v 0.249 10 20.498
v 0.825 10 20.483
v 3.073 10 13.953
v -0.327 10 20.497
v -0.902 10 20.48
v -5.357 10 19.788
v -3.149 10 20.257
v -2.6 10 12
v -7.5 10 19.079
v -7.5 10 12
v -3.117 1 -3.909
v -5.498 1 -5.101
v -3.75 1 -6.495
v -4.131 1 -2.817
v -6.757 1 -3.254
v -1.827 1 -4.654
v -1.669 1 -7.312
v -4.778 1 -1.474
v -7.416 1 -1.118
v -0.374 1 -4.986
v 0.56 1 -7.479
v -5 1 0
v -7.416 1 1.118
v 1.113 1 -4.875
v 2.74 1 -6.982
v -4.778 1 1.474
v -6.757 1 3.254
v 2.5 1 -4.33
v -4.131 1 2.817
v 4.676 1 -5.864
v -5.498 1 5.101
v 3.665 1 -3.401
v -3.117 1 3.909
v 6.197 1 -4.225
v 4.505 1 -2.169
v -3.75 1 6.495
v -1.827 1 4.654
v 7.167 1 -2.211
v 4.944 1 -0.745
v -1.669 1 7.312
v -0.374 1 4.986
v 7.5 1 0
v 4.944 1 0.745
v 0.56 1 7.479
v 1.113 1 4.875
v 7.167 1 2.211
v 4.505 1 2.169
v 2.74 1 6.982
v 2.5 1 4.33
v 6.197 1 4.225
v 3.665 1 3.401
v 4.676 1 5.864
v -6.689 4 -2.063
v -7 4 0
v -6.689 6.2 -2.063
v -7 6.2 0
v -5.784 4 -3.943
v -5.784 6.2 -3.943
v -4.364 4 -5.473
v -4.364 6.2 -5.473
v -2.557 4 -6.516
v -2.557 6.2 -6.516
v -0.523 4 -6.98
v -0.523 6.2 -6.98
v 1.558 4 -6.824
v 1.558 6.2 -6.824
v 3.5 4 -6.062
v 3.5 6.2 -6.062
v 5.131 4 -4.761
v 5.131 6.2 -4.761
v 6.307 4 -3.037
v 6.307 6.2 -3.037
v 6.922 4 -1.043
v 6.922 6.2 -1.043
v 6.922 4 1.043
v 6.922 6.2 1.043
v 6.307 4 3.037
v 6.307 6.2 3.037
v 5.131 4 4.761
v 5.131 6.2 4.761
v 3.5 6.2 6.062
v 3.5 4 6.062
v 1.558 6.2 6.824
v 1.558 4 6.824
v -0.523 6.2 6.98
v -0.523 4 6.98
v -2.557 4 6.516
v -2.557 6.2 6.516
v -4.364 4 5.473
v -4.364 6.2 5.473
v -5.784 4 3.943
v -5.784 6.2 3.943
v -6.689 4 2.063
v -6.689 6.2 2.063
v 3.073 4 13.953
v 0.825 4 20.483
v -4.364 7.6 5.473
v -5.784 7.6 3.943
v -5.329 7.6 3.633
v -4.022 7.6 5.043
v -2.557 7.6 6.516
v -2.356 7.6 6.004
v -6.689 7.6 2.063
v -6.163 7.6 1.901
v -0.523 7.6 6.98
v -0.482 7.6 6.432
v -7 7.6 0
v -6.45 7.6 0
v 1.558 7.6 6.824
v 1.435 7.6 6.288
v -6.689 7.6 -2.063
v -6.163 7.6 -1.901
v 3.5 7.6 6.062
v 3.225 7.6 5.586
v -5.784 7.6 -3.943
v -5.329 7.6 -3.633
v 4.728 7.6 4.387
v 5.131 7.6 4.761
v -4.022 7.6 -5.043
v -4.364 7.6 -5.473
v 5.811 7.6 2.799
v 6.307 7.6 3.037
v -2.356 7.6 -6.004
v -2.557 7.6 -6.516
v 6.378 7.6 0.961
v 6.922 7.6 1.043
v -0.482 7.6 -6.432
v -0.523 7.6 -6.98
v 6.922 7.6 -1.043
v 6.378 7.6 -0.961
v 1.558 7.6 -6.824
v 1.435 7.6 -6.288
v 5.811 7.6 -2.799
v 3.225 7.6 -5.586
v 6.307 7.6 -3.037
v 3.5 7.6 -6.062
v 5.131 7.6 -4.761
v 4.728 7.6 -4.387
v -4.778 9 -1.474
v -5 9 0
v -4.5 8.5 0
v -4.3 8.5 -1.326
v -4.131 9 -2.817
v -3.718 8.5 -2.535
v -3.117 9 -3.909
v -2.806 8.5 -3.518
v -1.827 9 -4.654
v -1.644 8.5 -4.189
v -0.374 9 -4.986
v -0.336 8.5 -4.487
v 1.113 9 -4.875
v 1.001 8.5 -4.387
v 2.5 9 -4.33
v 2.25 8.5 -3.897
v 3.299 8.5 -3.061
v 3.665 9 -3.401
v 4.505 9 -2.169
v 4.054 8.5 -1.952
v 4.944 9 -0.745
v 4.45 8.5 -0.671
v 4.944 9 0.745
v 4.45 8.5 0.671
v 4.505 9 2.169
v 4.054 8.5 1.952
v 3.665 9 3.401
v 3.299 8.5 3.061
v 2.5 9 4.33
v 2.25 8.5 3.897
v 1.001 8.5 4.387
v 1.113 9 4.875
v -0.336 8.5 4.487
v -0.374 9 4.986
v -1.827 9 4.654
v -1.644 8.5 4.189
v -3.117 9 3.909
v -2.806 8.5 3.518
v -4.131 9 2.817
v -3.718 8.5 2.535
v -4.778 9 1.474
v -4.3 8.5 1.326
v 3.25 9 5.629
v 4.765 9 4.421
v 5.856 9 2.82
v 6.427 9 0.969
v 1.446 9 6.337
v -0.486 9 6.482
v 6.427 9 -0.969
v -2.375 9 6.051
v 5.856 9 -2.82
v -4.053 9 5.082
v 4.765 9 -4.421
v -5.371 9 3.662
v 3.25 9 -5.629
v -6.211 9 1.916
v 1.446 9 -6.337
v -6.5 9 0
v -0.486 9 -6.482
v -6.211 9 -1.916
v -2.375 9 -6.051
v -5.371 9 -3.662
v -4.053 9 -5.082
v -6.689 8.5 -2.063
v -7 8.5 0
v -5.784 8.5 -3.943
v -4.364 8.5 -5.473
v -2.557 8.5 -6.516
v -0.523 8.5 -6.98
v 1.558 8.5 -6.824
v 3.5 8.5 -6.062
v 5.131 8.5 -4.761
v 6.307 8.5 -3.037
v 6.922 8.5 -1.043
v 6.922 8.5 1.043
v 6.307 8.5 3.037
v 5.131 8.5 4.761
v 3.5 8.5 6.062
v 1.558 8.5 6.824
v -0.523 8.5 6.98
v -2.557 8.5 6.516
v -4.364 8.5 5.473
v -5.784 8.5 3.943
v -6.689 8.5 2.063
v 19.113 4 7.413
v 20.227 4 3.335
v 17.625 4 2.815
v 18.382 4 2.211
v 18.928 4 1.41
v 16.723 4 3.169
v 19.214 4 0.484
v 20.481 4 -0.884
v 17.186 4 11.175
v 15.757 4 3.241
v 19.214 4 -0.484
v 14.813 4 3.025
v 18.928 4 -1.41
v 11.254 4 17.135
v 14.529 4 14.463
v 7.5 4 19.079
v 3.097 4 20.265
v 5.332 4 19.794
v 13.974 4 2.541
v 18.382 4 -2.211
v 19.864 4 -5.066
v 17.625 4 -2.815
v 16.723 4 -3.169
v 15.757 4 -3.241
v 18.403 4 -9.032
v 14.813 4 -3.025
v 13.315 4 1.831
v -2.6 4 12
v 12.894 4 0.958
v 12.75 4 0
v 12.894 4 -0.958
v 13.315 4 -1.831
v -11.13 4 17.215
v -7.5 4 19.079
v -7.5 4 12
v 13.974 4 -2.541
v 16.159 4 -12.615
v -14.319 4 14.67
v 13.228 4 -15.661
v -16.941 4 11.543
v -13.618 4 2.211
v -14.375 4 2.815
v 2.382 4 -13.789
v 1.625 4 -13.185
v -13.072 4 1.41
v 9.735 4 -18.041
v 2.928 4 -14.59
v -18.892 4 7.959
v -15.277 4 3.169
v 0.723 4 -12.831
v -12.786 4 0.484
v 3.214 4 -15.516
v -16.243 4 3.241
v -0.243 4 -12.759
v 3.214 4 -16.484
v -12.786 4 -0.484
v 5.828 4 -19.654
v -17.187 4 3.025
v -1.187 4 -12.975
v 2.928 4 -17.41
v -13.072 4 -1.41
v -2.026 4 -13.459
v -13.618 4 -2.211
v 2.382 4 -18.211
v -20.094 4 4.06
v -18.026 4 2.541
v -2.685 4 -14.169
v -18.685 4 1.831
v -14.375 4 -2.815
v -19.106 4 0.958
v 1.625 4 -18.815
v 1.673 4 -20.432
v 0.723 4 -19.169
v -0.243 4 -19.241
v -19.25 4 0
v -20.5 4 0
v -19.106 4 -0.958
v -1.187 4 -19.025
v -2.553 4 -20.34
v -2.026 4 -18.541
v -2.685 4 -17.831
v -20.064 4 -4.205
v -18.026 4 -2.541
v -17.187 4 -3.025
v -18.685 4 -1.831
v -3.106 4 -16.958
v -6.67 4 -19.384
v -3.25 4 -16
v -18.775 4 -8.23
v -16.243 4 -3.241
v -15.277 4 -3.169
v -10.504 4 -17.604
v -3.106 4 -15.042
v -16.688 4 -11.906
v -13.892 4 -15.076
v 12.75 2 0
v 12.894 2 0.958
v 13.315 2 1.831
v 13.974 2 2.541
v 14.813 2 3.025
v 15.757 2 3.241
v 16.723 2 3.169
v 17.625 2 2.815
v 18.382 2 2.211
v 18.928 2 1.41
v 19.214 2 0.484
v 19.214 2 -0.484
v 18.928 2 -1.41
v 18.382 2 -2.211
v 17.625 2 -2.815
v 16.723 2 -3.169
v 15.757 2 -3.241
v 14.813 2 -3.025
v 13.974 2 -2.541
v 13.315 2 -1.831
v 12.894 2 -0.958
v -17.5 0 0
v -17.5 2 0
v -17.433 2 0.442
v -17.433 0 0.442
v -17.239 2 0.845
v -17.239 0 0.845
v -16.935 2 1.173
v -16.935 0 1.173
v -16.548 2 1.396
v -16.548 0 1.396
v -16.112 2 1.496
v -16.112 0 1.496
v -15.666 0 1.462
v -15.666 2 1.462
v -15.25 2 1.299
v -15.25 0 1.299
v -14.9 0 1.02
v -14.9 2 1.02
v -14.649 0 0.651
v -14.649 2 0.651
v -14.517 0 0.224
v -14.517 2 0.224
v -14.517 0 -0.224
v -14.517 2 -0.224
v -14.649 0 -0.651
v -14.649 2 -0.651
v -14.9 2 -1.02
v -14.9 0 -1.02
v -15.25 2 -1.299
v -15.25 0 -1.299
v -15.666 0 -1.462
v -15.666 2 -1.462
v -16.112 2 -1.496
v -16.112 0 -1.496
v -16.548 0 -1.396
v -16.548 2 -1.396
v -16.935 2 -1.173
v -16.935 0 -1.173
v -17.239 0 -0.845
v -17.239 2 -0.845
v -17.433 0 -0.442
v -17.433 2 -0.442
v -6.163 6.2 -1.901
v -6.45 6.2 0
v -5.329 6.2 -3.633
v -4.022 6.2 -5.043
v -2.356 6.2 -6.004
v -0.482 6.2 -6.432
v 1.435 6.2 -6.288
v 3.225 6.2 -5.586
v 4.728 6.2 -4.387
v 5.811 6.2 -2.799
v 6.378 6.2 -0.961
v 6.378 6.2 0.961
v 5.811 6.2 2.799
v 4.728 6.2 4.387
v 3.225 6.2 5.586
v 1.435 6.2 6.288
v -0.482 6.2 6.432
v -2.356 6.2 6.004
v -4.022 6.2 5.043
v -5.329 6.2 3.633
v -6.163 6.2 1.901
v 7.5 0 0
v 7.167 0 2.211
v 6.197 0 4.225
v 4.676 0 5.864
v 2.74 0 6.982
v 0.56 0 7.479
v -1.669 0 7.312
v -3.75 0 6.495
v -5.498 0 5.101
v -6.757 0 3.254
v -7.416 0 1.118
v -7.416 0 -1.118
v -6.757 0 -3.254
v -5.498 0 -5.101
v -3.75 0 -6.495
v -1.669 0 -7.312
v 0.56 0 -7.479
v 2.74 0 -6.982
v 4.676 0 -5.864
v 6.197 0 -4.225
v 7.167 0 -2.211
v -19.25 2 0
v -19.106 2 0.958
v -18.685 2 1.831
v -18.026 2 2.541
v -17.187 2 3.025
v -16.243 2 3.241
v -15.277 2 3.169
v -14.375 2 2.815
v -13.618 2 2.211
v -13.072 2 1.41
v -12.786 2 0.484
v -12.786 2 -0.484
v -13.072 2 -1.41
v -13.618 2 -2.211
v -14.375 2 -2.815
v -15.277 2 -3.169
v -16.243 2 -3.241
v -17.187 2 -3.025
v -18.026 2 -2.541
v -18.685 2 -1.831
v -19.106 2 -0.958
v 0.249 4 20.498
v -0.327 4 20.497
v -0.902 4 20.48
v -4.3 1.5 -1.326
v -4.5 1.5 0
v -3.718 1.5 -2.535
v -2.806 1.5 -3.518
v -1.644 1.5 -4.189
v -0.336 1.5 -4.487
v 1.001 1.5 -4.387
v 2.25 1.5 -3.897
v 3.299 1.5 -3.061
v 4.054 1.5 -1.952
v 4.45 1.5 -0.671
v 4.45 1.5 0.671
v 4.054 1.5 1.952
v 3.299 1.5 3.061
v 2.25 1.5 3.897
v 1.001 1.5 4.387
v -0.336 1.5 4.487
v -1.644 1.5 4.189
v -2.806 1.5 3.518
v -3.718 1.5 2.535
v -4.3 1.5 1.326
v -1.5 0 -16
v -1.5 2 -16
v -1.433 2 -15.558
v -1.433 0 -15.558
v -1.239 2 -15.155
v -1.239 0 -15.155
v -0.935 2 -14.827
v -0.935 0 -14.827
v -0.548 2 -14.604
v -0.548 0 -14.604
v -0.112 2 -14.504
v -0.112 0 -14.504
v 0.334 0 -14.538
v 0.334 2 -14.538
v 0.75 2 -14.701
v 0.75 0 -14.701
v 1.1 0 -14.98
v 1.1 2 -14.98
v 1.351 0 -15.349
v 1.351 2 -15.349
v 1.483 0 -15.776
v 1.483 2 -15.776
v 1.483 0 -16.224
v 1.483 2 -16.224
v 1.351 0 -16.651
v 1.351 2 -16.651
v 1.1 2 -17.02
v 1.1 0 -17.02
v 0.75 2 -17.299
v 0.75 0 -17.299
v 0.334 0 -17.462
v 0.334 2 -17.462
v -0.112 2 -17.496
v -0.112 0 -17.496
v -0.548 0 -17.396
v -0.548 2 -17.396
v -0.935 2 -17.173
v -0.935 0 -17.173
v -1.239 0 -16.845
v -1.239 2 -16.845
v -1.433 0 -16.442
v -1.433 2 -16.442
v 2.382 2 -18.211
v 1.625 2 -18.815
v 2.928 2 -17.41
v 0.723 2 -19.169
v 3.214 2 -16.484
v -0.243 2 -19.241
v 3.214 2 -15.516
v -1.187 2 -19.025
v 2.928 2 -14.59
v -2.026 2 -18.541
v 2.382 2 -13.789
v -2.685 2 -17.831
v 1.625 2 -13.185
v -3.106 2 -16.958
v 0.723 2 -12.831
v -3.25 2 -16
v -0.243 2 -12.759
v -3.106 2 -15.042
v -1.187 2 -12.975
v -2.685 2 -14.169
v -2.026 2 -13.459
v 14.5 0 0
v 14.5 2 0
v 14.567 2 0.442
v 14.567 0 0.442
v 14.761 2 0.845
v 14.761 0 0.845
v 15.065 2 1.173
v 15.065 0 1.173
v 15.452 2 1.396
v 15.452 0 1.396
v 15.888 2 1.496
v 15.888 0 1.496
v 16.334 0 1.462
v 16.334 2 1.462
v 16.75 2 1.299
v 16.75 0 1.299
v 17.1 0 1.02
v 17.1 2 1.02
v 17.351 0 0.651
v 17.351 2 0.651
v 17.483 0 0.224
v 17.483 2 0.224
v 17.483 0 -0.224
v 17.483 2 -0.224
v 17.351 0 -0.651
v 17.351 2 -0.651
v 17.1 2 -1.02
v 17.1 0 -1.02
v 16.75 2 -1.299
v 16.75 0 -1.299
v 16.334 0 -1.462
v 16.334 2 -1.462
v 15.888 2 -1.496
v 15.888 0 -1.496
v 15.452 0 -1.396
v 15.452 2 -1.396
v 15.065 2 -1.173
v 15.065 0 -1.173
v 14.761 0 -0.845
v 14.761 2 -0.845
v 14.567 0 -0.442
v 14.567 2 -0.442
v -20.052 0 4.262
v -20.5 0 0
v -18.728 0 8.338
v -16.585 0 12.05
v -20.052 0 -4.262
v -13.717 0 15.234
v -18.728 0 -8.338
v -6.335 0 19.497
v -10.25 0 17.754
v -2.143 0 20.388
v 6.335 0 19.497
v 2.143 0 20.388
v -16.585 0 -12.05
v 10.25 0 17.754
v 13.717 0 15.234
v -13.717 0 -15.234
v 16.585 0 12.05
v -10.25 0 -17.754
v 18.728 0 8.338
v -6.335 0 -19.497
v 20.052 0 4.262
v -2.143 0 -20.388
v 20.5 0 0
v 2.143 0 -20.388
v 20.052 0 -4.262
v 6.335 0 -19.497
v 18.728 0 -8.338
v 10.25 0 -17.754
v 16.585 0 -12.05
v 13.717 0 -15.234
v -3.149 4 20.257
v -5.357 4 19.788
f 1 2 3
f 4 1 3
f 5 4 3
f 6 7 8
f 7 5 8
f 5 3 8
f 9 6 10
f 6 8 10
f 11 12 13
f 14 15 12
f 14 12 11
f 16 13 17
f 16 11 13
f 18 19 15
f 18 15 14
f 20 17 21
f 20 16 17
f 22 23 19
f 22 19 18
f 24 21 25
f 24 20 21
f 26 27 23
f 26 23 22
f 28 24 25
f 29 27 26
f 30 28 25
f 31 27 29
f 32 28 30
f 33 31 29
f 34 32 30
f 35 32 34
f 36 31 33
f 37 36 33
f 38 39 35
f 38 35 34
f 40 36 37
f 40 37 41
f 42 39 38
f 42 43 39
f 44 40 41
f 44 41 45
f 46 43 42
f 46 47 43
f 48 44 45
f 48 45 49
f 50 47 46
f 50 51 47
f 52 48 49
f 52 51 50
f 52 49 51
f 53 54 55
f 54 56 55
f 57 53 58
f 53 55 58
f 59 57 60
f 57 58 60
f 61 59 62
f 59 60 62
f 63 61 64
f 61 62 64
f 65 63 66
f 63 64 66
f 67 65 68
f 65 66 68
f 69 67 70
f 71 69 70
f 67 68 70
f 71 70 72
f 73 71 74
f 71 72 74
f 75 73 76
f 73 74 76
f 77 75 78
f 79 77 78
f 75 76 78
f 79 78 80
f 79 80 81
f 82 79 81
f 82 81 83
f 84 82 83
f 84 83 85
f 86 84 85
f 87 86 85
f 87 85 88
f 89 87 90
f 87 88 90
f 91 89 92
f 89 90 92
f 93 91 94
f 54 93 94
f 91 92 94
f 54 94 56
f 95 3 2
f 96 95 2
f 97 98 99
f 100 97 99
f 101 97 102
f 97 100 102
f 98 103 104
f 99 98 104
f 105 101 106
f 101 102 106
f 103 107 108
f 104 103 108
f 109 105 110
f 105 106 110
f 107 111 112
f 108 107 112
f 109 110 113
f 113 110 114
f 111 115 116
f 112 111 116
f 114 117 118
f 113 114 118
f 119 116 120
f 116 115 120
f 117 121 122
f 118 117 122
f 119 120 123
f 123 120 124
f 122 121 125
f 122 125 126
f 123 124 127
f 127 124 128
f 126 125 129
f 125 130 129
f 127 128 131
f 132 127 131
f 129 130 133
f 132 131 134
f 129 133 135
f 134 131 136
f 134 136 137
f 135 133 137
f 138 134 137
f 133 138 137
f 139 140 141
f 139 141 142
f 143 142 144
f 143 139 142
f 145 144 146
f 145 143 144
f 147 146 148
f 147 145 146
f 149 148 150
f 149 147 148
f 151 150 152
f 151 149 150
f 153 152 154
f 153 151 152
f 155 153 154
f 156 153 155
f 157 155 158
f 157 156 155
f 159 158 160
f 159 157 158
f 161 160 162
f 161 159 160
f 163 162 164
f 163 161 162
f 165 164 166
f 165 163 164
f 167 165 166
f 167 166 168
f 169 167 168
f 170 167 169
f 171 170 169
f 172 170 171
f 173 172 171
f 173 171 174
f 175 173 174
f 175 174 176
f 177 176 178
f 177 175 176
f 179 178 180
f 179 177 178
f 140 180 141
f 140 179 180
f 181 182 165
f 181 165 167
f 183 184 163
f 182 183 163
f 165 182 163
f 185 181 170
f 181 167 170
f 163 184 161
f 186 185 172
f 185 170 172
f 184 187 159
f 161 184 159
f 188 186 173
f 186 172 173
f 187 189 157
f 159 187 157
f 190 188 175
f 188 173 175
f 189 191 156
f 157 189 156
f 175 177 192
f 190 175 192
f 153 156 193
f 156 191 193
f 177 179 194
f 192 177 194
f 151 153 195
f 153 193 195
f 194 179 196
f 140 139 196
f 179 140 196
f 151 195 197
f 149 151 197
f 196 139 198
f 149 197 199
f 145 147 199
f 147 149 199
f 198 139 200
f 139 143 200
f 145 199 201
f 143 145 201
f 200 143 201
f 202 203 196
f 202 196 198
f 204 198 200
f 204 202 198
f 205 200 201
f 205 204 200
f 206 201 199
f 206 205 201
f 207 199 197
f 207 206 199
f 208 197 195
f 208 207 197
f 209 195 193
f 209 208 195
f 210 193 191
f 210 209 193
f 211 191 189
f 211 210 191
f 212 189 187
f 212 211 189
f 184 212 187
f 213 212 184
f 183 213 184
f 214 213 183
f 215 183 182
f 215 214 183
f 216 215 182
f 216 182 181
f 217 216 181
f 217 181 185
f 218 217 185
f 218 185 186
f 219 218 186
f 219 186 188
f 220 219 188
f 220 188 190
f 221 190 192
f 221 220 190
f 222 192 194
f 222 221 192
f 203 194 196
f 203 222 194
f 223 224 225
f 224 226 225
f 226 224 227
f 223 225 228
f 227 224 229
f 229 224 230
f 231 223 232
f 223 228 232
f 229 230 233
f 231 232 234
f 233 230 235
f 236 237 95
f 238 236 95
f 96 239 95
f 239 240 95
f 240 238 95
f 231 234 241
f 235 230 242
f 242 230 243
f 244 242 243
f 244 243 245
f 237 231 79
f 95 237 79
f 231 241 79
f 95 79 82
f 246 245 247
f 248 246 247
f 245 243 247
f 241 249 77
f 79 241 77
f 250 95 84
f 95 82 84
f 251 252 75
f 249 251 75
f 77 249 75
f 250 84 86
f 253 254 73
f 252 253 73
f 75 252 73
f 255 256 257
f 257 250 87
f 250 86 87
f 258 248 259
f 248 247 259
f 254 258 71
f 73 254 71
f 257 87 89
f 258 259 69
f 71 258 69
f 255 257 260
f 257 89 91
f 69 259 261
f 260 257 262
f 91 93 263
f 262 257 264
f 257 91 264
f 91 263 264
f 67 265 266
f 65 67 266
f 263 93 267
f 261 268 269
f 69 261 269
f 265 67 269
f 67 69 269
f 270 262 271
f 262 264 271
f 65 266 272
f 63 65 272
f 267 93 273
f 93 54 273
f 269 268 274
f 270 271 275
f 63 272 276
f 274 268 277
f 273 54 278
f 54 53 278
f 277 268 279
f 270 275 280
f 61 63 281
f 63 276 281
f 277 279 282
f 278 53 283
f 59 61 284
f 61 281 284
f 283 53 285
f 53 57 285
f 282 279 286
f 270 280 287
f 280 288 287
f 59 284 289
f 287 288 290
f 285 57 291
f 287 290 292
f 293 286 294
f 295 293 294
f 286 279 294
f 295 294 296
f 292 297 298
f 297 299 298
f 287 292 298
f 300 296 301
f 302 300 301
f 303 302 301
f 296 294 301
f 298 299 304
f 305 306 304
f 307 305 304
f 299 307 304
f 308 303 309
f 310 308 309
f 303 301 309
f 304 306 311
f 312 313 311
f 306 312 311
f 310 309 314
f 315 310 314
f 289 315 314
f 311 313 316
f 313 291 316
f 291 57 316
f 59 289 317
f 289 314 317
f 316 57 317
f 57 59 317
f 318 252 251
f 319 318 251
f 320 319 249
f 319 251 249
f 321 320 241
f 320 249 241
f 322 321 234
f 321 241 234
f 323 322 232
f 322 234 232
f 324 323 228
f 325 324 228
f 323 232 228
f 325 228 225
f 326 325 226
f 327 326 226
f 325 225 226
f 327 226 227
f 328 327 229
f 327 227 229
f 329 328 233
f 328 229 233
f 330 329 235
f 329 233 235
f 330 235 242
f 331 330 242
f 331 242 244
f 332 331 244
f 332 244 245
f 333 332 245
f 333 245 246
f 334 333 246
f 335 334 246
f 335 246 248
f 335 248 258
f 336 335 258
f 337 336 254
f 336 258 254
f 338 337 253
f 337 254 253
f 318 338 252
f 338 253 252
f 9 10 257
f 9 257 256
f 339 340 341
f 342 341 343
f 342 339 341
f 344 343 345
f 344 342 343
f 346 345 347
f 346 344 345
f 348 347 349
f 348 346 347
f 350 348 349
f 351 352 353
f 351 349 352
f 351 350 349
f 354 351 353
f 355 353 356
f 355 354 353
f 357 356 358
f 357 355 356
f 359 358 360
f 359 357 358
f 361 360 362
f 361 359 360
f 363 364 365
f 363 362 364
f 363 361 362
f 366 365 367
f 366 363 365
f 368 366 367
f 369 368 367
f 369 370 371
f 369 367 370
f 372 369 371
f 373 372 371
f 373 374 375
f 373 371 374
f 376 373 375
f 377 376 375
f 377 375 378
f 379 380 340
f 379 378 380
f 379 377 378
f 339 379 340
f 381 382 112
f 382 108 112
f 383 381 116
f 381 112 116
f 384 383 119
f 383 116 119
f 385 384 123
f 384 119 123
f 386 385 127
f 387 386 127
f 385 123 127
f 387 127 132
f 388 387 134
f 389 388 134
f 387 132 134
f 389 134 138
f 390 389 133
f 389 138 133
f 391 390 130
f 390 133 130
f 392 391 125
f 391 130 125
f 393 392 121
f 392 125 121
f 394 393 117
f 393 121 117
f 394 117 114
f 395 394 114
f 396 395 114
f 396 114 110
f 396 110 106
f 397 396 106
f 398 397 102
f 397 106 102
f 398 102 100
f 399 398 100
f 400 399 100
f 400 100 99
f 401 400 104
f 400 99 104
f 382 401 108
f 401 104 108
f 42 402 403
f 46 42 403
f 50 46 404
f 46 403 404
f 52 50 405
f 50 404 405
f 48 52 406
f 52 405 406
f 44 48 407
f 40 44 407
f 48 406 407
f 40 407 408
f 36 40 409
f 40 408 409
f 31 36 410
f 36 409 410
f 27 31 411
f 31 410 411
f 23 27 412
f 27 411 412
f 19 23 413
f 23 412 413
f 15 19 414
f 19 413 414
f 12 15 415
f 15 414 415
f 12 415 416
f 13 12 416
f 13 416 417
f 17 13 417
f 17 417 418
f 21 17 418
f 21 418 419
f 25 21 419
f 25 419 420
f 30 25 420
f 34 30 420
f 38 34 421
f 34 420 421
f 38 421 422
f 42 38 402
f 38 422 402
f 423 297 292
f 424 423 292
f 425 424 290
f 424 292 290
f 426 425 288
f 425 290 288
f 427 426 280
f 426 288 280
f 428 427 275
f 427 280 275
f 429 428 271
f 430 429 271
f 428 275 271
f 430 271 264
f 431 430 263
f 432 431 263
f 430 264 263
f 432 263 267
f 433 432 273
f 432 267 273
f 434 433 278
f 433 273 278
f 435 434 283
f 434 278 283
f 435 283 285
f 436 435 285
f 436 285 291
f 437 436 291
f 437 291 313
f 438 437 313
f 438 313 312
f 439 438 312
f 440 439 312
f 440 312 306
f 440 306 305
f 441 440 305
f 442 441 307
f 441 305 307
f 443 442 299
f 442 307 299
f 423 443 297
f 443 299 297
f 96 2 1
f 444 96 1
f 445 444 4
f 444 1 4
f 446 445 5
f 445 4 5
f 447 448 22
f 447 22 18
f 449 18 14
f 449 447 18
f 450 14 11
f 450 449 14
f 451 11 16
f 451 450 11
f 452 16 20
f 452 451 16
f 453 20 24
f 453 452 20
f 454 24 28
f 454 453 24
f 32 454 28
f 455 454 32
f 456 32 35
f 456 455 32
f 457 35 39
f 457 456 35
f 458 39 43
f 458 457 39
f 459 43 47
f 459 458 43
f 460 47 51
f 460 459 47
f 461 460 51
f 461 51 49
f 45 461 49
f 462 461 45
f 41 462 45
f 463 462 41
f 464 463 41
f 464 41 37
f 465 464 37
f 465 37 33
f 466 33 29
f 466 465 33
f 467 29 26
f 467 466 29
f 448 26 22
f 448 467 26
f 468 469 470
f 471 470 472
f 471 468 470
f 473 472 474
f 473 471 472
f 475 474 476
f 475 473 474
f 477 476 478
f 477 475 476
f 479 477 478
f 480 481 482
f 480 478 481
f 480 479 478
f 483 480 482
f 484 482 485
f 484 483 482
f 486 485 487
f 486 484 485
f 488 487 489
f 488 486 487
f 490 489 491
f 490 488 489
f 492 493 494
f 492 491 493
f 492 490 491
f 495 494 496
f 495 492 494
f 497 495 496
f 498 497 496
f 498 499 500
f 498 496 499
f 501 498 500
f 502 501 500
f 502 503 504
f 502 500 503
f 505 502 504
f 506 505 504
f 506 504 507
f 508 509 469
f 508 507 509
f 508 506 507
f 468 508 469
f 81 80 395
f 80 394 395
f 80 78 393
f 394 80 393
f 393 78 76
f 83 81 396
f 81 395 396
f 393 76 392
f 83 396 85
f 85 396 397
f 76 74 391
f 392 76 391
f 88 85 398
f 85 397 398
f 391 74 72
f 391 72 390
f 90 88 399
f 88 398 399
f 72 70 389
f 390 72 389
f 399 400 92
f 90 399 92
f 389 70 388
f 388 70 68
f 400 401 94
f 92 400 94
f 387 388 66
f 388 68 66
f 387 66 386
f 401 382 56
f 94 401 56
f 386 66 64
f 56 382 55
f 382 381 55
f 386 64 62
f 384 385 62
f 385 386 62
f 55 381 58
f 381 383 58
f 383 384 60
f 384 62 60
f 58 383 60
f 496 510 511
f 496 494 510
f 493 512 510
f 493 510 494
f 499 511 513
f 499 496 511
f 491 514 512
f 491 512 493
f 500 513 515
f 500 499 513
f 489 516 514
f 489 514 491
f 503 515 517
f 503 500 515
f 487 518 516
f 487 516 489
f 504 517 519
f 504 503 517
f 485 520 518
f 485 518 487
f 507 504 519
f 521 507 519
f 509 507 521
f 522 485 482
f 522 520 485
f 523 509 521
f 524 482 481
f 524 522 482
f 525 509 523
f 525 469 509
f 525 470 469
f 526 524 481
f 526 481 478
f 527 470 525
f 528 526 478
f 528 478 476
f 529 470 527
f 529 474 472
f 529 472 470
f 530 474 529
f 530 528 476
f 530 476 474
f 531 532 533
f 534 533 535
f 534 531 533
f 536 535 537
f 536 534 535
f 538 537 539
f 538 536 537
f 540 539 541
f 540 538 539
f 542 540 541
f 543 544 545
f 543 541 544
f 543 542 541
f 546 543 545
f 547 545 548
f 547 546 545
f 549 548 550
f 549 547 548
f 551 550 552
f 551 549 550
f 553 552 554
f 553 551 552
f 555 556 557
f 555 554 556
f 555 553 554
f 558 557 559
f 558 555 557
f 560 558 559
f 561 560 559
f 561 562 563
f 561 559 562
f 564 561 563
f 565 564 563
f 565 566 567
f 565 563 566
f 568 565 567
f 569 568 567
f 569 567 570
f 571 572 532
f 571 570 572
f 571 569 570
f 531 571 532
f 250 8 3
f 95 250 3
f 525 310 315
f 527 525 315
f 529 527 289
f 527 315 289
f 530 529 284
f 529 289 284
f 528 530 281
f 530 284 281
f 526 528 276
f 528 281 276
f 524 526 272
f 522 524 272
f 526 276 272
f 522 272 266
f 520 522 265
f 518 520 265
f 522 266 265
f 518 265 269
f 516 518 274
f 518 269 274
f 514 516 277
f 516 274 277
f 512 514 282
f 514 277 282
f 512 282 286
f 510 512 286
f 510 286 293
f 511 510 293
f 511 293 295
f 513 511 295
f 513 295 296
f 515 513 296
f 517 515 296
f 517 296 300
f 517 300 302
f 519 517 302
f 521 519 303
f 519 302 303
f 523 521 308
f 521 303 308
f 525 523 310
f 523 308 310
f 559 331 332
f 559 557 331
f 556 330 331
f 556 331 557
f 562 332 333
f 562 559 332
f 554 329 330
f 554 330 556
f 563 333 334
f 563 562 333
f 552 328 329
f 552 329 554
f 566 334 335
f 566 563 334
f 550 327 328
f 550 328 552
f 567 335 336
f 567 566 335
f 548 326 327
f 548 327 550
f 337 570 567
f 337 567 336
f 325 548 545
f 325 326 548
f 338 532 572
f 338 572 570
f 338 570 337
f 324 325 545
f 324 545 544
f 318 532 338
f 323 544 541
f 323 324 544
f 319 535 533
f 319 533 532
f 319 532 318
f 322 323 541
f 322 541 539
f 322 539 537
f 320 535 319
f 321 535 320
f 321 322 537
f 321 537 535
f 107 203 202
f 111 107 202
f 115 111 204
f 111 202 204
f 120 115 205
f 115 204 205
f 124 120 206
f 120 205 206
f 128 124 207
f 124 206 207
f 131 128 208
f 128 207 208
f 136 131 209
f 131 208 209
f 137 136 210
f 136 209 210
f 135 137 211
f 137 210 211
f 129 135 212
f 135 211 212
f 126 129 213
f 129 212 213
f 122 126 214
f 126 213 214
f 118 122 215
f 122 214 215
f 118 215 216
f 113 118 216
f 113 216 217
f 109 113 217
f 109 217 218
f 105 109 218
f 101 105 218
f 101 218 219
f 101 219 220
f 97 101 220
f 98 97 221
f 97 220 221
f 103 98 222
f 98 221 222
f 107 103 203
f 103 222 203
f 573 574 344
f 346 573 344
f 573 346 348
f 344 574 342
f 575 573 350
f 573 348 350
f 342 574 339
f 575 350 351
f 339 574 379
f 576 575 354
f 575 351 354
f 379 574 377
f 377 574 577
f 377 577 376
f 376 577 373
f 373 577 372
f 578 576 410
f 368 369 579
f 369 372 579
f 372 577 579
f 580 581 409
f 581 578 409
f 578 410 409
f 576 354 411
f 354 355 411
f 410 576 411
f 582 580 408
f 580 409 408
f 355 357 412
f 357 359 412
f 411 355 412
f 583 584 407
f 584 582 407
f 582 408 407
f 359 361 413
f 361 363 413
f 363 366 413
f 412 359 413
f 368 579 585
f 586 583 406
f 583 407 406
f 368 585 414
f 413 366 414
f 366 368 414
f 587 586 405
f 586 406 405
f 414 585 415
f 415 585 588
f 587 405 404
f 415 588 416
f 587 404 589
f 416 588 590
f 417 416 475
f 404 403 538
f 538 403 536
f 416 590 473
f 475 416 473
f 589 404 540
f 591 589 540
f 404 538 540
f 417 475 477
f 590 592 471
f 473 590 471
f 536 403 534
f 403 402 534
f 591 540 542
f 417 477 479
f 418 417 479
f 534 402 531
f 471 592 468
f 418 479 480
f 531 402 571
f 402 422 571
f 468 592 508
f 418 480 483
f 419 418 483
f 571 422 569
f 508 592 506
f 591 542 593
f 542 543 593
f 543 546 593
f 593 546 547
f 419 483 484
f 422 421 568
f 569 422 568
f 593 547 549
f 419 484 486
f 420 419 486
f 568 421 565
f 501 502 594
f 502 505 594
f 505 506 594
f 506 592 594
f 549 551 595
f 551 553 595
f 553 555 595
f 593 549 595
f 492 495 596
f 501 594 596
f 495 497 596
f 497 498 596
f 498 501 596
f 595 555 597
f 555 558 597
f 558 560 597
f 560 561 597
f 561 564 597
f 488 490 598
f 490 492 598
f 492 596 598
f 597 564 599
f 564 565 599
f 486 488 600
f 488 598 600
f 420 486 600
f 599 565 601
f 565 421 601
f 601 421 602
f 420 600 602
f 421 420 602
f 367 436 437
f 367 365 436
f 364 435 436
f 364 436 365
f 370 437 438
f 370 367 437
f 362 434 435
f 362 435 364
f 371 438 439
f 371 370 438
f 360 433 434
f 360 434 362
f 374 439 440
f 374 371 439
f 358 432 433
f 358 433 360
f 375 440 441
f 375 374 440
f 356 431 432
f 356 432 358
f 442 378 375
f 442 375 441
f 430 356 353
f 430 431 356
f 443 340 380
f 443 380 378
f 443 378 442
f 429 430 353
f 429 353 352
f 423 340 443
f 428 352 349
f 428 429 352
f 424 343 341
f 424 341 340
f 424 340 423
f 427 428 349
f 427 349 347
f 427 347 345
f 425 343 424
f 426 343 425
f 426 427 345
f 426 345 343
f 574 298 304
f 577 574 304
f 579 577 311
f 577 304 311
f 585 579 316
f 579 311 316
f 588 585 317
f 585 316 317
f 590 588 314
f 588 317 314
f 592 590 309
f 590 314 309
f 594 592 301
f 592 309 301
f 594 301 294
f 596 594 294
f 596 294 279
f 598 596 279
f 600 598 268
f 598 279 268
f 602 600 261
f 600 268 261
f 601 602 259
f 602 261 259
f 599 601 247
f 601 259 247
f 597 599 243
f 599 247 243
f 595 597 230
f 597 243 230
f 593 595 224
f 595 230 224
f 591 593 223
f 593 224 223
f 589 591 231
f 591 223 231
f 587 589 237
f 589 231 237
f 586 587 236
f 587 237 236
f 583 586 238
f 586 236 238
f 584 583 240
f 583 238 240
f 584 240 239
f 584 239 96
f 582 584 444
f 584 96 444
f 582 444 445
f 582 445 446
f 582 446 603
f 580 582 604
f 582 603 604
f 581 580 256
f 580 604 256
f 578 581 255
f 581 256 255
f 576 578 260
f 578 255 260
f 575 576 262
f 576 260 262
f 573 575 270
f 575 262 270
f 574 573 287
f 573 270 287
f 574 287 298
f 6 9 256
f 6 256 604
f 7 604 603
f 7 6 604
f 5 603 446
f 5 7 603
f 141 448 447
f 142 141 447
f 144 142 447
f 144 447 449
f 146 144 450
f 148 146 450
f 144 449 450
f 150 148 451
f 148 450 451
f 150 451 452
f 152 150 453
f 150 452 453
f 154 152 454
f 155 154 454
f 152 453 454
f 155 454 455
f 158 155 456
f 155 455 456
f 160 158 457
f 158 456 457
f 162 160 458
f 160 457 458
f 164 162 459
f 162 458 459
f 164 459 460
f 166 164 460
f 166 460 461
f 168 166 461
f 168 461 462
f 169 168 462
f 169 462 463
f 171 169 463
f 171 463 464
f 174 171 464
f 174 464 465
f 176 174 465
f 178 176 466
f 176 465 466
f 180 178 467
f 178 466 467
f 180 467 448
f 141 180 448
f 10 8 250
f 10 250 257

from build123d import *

# Parameters (mm, degrees)
SKETCH_2_R          = 1.5
CUT_EXTRUDE_1_DEPTH = 31.356218473
CUT_EXTRUDE_START   = 4
SKETCH_3_R          = 3.25
CUT_EXTRUDE_2_DEPTH = 2
EXTRUDE_START       = 6
EXTRUDE_1_DEPTH     = 6
SKETCH_5_R          = 7.5
CUT_EXTRUDE_3_DEPTH = 1
CHAMFER_1_SIZE      = 0.5
CHAMFER_2_SIZE      = 0.5
CUT_EXTRUDE_4_DEPTH = 6
EXTRUDE_2_DEPTH     = 6


with BuildPart() as part:
    # 草图1 → 旋转1 (revolve)
    with BuildSketch(Plane.XY):
        Polygon((-4.5, 0), (-20.5, 0), (-20.5, 4), (-7, 4), (-7, 6.2), (-6.45, 6.2), (-6.45, 7.6), (-7, 7.6), (-7, 9), (-4.5, 9), align=None)
    revolve(axis=Axis((0, 7, 0), (0, -1, 0)))

    # 草图2 → 切除-拉伸1 (cut, through all)
    with BuildSketch(Plane(origin=(0, 0, 0), x_dir=(1, 0, 0), z_dir=(0, 1, 0))):
        with Locations(Location((-16, 0, 0), (0, 0, 180))):
            Circle(SKETCH_2_R)
        with Locations(Location((0, 16, 0), (0, 0, 180))):
            Circle(SKETCH_2_R)
        with Locations(Location((16, 0, 0), (0, 0, 180))):
            Circle(SKETCH_2_R)
    extrude(amount=CUT_EXTRUDE_1_DEPTH, mode=Mode.SUBTRACT)

    # 草图3 → 切除-拉伸2 (cut)
    with BuildSketch(Plane(origin=(0, 0, 0), x_dir=(1, 0, 0), z_dir=(0, 1, 0)).offset(CUT_EXTRUDE_START)):
        with Locations(Location((-16, 0, 0), (0, 0, 180))):
            Circle(SKETCH_3_R)
        with Locations(Location((0, 16, 0), (0, 0, 180))):
            Circle(SKETCH_3_R)
        with Locations(Location((16, 0, 0), (0, 0, 180))):
            Circle(SKETCH_3_R)
    extrude(amount=-CUT_EXTRUDE_2_DEPTH, mode=Mode.SUBTRACT)

    # 草图4 → 凸台-拉伸1 (add)
    with BuildSketch(Plane(origin=(0, 4, 0), x_dir=(1, 0, 0), z_dir=(0, 1, 0)).offset(EXTRUDE_START)):
        with BuildLine():
            Line((7.5, -12), (-7.5, -12))
            Line((-7.5, -12), (-7.5, -19.078784028))
            ThreePointArc((-7.5, -19.078784028), (0, -20.5), (7.5, -19.078784028))
            Line((7.5, -19.078784028), (7.5, -12))
        make_face()
    extrude(amount=-EXTRUDE_1_DEPTH)

    # 草图5 → 切除-拉伸3 (cut)
    with BuildSketch(Plane.XZ):
        Circle(SKETCH_5_R)
    extrude(amount=-CUT_EXTRUDE_3_DEPTH, mode=Mode.SUBTRACT)

    # 倒角1
    chamfer_1_edges = [part.edges().sort_by_distance(p)[0] for p in [
        (4.5, 1, 0),
        (4.5, 9, 0),
    ]]
    chamfer(chamfer_1_edges, length=CHAMFER_1_SIZE)

    # 倒角2
    chamfer_2_edges = [part.edges().sort_by_distance(p)[0] for p in [
        (7, 9, 0),
    ]]
    chamfer(chamfer_2_edges, length=CHAMFER_2_SIZE)

    # 草图6 → 切除-拉伸4 (cut)
    with BuildSketch(Plane(origin=(0, 10, 0), x_dir=(1, 0, 0), z_dir=(0, 1, 0))):
        Polygon((1.967727288, -14.033683215), (-1.353682174, -21.493691009), (7.5, -20.908921831), (7.5, -12), (-2.6, -12), align=None)
    extrude(amount=-CUT_EXTRUDE_4_DEPTH, mode=Mode.SUBTRACT)

    # 草图7 → 凸台-拉伸2 (add)
    with BuildSketch(Plane(origin=(0, 4, 0), x_dir=(1, 0, 0), z_dir=(0, 1, 0)).offset(EXTRUDE_START)):
        with BuildLine():
            Line((-2.6, -12), (3.073111454, -13.953408927))
            Line((3.073111454, -13.953408927), (0.824652926, -20.483406639))
            ThreePointArc((0.824652926, -20.483406639), (-0.038915526, -20.499963063), (-0.902414897, -20.480128109))
            Line((-0.902414897, -20.480128109), (1.967727288, -14.033683215))
            Line((1.967727288, -14.033683215), (-2.6, -12))
        make_face()
    extrude(amount=-EXTRUDE_2_DEPTH)


solid = part.part
